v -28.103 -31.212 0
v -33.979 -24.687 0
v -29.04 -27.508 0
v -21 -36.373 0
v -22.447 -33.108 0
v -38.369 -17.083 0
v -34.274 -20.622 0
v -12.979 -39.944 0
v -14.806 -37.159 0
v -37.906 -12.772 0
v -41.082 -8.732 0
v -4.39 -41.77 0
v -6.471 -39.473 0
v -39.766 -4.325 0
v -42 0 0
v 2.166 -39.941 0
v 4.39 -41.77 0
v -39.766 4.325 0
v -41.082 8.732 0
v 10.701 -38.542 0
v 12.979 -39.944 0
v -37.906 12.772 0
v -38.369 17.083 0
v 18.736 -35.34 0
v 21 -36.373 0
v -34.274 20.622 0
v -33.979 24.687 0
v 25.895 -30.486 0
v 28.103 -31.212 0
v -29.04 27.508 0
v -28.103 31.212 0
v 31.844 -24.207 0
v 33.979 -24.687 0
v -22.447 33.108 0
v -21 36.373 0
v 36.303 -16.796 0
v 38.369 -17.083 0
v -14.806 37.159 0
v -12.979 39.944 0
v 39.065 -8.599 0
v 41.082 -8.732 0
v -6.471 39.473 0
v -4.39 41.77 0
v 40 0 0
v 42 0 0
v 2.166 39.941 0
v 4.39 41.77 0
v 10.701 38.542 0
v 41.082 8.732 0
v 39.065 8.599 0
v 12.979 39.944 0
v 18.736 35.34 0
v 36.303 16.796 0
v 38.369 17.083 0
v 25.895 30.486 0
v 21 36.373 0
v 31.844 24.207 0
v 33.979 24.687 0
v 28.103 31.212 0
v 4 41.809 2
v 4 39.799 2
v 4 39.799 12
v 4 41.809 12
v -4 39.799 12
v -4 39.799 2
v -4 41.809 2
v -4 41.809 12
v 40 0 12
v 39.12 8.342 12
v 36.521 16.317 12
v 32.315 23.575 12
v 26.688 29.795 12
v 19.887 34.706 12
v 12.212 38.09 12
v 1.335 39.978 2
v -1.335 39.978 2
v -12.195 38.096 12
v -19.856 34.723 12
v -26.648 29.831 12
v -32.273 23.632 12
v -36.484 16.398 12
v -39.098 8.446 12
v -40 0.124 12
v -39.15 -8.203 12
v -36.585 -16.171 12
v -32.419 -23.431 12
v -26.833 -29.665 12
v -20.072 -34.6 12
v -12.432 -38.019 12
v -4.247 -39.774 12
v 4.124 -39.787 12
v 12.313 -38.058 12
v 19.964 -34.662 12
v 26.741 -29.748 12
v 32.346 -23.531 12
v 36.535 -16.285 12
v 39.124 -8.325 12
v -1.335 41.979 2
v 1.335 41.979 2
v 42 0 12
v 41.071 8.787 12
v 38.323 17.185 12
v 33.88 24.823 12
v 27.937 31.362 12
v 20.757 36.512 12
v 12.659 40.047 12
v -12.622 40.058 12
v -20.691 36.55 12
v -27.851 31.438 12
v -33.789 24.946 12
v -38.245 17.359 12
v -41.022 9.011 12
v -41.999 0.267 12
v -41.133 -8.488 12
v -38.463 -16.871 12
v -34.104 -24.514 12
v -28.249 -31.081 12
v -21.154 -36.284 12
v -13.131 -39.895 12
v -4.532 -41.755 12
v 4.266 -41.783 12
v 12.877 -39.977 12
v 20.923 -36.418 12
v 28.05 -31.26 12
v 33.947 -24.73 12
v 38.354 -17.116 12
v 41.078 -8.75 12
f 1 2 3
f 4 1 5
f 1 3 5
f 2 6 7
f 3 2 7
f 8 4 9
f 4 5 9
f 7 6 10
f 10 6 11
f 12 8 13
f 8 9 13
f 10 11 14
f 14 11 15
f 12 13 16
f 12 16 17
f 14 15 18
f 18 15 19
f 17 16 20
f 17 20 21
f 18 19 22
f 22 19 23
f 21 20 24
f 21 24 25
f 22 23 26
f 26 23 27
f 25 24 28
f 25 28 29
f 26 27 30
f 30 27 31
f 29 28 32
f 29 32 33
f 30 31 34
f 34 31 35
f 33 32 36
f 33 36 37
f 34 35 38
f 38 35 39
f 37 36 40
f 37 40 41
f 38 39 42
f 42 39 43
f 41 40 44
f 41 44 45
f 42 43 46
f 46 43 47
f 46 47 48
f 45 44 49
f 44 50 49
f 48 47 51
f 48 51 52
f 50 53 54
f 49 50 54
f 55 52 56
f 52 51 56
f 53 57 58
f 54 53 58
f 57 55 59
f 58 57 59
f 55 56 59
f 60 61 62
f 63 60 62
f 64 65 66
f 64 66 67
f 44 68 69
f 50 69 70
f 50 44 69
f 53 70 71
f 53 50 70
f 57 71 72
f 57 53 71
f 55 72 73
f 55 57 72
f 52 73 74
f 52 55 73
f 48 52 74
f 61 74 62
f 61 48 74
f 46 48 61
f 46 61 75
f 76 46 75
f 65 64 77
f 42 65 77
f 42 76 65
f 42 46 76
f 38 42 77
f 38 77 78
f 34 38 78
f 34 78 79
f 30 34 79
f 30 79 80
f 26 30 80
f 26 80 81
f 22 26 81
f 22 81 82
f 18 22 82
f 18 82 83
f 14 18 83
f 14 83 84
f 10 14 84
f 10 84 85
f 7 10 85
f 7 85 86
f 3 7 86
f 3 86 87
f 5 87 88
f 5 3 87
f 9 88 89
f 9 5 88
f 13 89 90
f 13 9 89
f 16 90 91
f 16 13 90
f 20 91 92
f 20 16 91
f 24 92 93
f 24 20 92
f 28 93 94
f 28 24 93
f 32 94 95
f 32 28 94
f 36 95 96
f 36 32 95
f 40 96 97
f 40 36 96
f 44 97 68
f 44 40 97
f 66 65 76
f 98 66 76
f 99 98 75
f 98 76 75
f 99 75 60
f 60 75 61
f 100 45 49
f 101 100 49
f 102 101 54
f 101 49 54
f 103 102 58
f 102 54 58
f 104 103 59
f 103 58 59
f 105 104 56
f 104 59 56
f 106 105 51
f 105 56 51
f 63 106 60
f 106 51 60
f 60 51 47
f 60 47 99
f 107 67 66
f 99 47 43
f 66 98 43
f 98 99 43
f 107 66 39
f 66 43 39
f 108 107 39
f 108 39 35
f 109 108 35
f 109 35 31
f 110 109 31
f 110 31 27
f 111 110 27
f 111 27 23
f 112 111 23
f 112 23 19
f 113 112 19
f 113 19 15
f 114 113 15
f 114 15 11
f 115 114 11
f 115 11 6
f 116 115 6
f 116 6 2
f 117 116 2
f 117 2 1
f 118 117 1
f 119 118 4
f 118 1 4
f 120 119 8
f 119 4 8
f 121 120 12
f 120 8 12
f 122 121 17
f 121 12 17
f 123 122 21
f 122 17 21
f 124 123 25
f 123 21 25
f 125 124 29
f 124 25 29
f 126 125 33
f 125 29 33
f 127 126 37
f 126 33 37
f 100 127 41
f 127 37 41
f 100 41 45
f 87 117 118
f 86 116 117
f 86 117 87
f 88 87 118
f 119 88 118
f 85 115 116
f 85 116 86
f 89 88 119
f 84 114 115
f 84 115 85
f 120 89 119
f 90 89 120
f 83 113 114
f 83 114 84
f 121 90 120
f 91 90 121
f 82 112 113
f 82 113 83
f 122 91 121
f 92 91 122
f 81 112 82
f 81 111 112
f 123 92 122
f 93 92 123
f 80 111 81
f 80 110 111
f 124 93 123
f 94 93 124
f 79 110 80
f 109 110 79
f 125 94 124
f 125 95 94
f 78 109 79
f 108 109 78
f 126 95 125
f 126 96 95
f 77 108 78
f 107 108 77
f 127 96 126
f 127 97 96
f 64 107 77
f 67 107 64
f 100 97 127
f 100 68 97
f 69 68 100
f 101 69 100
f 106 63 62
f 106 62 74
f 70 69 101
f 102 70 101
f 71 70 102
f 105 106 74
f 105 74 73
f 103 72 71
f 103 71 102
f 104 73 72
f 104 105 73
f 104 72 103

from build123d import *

# Parameters (mm, degrees)
SKETCH002_R   = 42
SKETCH002_R_2 = 40
PAD001_DEPTH  = 12
SKETCH003_W   = 8
SKETCH003_H   = 12
POCKET_DEPTH  = 42.001


with BuildPart() as part:
    # Sketch002 → Pad001 (new body)
    with BuildSketch(Plane.XY):
        Circle(SKETCH002_R)
        Circle(SKETCH002_R_2, mode=Mode.SUBTRACT)
    extrude(amount=PAD001_DEPTH)

    # Sketch003 → Pocket (cut, through all)
    with BuildSketch(Plane.XZ):
        with Locations((0, 8)):
            Rectangle(SKETCH003_W, SKETCH003_H)
    extrude(amount=-POCKET_DEPTH, mode=Mode.SUBTRACT)


solid = part.part
